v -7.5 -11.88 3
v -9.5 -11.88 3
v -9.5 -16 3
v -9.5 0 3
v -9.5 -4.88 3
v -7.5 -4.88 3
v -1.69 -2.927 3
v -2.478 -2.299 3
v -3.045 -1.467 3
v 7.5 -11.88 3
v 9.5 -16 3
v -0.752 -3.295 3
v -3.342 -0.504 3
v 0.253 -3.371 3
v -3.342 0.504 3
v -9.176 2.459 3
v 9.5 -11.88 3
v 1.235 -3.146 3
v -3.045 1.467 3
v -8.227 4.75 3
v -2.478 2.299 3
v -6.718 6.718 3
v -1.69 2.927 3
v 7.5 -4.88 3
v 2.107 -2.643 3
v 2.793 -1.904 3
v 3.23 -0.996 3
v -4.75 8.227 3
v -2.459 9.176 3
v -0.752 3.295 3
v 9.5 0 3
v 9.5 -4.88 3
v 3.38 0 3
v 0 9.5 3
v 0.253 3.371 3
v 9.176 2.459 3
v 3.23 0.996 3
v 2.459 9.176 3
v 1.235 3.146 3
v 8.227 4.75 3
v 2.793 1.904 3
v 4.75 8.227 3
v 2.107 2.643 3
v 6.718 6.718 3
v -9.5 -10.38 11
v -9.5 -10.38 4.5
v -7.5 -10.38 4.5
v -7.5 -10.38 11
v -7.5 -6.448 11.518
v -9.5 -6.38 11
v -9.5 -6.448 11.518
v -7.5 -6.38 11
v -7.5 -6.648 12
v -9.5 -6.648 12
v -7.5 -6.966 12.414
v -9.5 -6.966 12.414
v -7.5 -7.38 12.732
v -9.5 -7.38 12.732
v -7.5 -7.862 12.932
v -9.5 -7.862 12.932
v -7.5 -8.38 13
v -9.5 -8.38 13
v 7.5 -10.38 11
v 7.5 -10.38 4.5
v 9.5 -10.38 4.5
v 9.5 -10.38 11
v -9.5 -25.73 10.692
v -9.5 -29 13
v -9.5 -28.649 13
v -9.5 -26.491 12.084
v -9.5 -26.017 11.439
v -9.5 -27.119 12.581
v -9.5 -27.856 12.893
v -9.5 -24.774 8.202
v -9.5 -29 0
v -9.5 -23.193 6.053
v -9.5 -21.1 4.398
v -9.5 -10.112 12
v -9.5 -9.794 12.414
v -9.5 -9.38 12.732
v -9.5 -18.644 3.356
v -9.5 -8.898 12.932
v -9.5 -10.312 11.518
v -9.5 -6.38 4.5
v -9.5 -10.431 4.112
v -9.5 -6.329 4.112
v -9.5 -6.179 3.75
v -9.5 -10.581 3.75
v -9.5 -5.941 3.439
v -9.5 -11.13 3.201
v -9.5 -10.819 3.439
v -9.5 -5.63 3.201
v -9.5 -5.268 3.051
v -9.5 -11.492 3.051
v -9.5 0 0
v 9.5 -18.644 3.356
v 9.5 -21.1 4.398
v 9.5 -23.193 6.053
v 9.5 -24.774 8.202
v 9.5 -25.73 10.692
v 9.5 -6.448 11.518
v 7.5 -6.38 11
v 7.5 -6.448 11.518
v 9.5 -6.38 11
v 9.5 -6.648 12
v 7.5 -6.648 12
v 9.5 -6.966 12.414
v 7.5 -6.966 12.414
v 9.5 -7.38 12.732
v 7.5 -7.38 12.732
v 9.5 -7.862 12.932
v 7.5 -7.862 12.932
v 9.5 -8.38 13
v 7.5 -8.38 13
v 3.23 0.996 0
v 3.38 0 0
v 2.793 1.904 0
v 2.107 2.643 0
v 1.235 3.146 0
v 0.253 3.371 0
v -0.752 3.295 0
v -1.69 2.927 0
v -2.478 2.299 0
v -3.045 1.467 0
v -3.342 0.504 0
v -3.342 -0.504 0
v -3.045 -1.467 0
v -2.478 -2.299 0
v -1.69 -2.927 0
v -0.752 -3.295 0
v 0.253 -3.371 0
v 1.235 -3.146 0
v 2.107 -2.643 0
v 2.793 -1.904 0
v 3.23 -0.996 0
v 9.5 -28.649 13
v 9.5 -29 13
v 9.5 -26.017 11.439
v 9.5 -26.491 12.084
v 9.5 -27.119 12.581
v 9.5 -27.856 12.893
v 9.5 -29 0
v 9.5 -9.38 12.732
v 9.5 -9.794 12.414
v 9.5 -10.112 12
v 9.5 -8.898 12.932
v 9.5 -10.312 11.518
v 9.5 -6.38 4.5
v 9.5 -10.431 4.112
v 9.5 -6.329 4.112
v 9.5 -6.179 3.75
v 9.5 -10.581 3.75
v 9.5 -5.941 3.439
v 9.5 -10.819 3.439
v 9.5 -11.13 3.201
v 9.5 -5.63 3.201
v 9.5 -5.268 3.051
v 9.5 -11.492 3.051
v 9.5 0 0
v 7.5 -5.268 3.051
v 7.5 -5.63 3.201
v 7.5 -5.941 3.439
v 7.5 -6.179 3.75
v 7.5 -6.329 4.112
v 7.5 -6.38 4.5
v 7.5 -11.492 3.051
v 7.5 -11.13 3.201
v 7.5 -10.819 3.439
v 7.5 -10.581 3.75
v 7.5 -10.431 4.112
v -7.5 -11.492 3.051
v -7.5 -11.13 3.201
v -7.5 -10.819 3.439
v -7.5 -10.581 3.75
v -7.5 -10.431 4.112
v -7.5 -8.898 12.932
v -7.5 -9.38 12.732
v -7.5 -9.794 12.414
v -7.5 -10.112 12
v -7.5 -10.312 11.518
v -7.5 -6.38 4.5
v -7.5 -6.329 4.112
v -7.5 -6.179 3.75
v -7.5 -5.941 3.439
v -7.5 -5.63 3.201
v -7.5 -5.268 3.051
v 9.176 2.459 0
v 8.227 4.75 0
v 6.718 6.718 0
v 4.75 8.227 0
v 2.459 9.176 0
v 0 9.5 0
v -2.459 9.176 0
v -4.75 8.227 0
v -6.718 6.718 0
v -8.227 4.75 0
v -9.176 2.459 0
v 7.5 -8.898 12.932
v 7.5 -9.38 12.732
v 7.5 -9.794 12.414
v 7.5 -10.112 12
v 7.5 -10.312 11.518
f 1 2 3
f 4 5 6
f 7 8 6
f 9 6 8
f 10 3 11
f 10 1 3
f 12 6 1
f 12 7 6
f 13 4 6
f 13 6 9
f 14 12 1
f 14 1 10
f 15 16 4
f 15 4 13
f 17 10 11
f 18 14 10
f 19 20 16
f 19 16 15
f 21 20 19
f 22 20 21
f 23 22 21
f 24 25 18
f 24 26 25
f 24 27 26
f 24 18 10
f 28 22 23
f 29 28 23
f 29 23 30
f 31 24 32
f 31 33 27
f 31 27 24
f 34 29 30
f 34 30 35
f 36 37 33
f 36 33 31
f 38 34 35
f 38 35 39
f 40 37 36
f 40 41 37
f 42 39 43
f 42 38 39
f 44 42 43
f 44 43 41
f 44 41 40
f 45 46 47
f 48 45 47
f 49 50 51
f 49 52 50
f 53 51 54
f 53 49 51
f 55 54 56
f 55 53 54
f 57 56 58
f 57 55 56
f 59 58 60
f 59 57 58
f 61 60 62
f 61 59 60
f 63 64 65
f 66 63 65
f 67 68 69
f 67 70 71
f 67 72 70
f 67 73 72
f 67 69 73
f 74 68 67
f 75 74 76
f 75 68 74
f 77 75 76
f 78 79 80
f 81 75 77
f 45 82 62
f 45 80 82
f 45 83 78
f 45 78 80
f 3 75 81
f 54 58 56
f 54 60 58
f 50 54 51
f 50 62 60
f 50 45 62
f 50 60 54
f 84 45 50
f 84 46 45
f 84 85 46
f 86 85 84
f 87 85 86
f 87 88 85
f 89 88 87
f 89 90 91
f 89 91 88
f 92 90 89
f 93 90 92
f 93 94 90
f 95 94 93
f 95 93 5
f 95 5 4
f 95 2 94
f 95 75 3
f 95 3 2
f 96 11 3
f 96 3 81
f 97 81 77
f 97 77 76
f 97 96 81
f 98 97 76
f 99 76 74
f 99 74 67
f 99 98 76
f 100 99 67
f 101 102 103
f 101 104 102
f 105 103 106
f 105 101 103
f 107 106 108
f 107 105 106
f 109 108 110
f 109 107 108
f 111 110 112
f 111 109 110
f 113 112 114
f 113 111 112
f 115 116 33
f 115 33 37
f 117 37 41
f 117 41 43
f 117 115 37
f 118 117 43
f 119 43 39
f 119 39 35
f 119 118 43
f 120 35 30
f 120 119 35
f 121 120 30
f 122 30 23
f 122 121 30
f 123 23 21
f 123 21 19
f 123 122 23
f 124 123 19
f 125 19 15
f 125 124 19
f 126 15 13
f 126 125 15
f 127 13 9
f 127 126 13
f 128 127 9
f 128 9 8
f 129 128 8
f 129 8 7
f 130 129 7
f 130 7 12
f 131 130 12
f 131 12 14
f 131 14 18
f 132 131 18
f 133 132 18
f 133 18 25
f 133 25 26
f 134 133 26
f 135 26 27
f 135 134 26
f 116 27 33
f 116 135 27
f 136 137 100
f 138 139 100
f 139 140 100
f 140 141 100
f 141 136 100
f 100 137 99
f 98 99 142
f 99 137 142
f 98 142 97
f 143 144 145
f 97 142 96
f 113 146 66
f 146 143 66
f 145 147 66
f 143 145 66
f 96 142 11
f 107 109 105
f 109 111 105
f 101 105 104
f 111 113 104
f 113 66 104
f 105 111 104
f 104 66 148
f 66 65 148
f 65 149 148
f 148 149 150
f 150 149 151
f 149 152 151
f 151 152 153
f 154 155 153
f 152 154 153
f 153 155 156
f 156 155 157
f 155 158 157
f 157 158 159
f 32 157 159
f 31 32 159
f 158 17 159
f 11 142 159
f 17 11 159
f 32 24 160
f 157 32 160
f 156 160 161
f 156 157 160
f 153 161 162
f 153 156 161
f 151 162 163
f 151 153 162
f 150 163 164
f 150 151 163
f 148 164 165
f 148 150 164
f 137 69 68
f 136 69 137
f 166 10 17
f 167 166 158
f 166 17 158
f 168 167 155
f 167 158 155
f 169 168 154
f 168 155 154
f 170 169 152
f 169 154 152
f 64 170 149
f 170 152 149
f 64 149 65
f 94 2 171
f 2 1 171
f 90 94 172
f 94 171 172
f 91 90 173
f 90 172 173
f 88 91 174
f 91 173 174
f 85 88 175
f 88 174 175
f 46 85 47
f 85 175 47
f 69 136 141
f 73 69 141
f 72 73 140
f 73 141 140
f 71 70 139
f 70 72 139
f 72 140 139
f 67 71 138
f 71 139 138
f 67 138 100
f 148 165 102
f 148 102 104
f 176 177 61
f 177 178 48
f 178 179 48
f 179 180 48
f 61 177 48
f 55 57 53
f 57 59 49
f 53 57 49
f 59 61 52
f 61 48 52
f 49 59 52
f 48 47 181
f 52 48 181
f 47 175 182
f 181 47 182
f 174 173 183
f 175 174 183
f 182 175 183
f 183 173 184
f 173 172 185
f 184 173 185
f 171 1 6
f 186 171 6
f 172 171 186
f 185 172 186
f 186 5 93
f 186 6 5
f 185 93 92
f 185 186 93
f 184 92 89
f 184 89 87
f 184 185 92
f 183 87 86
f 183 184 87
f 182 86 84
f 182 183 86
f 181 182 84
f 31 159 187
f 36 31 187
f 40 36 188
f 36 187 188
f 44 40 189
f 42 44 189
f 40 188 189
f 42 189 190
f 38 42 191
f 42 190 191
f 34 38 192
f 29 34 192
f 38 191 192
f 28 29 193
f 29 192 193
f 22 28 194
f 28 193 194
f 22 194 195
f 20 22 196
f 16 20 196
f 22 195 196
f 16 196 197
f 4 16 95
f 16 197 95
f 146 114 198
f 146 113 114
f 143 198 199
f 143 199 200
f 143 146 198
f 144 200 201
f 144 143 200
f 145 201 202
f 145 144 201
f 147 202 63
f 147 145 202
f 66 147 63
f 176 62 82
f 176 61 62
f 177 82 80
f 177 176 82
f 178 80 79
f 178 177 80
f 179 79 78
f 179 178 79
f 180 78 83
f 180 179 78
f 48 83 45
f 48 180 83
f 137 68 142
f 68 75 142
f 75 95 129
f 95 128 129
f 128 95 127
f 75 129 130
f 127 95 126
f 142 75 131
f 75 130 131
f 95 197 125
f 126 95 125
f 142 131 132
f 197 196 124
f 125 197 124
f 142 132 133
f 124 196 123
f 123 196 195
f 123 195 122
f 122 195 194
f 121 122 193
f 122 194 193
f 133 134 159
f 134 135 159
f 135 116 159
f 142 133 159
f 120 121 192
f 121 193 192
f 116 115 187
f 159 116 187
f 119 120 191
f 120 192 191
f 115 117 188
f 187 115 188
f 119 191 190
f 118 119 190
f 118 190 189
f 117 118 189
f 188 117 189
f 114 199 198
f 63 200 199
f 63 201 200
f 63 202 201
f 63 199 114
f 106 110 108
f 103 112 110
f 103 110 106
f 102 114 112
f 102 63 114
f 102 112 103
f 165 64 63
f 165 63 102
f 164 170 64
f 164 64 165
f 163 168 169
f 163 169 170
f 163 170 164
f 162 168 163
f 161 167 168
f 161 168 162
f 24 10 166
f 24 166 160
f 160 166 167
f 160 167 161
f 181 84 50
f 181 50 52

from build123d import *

# Parameters (mm, degrees)
CROQUIS2_R              = 3.38
SALIENTE_EXTRUIR1_DEPTH = 3
CROQUIS4_W              = 19
CROQUIS4_H              = 3
SALIENTE_EXTRUIR2_DEPTH = 10
REDONDEO1_R             = 10
CROQUIS7_W              = 2
CROQUIS7_H              = 4
SALIENTE_EXTRUIR4_DEPTH = 10
REDONDEO4_R             = 1.5
REDONDEO5_R             = 2
REDONDEO6_R             = 3


# Some blends are built 0.0001 mm under size
with BuildPart() as part:
    # Croquis2 → Saliente-Extruir1 (new body)
    with BuildSketch(Plane.XY):
        with BuildLine():
            Line((-9.5, 0), (-9.5, -29))
            Line((-9.5, -29), (9.5, -29))
            Line((9.5, -29), (9.5, 0))
            ThreePointArc((9.5, 0), (0, 9.5), (-9.5, 0))
        make_face()
        Circle(CROQUIS2_R, mode=Mode.SUBTRACT)
    extrude(amount=SALIENTE_EXTRUIR1_DEPTH)

    # Croquis4 → Saliente-Extruir2 (add)
    with BuildSketch(Plane.XY.offset(3)):
        with Locations((0, -27.5)):
            Rectangle(CROQUIS4_W, CROQUIS4_H)
    extrude(amount=SALIENTE_EXTRUIR2_DEPTH)

    # Redondeo1
    redondeo1_edges = [part.edges().sort_by_distance(p)[0] for p in [
        (0, -26, 3),
    ]]
    fillet(redondeo1_edges, radius=REDONDEO1_R - 0.0001)  # a hair under: the kernel refuses the full size

    # Croquis7 → Saliente-Extruir4 (add)
    with BuildSketch(Plane.XY.offset(3)):
        with Locations((-8.5, -8.38)):
            Rectangle(CROQUIS7_W, CROQUIS7_H)
        with Locations((8.5, -8.38)):
            Rectangle(CROQUIS7_W, CROQUIS7_H)
    extrude(amount=SALIENTE_EXTRUIR4_DEPTH)

    # Redondeo4
    redondeo4_edges = [part.edges().sort_by_distance(p)[0] for p in [
        (-8.5, -6.38, 3),
        (-8.5, -10.38, 3),
        (8.5, -6.38, 3),
        (8.5, -10.38, 3),
    ]]
    fillet(redondeo4_edges, radius=REDONDEO4_R)

    # Redondeo5
    redondeo5_edges = [part.edges().sort_by_distance(p)[0] for p in [
        (8.5, -10.38, 13),
        (8.5, -6.38, 13),
        (-8.5, -10.38, 13),
        (-8.5, -6.38, 13),
    ]]
    fillet(redondeo5_edges, radius=REDONDEO5_R - 0.0001)  # a hair under: the kernel refuses the full size

    # Redondeo6
    # the kernel refuses this fillet: 3 mm, written as the material it takes off along each edge
    with BuildSketch(Plane(origin=(16.122828959, -26, 13), x_dir=(0, -1, 0), z_dir=(-1, 0, 0))) as redondeo6_piece_1:
        with BuildLine():
            CenterArc((2.649131583, -3), REDONDEO6_R, 90, 76.657984638)
            Line((-0.269898159, -2.307710059), (-0.561801133, -2.238481065))
            ThreePointArc((-0.561801133, -2.238481065), (-0.3, -0.0001), (-0.3, 0))
            Line((-0.3, 0), (0, 0.3))
            Line((0, 0.3), (2.649131583, 0.3))
            Line((2.649131583, 0.3), (2.649131583, 0))
        make_face()
    extrude(amount=32.245657917, mode=Mode.SUBTRACT)


solid = part.part
